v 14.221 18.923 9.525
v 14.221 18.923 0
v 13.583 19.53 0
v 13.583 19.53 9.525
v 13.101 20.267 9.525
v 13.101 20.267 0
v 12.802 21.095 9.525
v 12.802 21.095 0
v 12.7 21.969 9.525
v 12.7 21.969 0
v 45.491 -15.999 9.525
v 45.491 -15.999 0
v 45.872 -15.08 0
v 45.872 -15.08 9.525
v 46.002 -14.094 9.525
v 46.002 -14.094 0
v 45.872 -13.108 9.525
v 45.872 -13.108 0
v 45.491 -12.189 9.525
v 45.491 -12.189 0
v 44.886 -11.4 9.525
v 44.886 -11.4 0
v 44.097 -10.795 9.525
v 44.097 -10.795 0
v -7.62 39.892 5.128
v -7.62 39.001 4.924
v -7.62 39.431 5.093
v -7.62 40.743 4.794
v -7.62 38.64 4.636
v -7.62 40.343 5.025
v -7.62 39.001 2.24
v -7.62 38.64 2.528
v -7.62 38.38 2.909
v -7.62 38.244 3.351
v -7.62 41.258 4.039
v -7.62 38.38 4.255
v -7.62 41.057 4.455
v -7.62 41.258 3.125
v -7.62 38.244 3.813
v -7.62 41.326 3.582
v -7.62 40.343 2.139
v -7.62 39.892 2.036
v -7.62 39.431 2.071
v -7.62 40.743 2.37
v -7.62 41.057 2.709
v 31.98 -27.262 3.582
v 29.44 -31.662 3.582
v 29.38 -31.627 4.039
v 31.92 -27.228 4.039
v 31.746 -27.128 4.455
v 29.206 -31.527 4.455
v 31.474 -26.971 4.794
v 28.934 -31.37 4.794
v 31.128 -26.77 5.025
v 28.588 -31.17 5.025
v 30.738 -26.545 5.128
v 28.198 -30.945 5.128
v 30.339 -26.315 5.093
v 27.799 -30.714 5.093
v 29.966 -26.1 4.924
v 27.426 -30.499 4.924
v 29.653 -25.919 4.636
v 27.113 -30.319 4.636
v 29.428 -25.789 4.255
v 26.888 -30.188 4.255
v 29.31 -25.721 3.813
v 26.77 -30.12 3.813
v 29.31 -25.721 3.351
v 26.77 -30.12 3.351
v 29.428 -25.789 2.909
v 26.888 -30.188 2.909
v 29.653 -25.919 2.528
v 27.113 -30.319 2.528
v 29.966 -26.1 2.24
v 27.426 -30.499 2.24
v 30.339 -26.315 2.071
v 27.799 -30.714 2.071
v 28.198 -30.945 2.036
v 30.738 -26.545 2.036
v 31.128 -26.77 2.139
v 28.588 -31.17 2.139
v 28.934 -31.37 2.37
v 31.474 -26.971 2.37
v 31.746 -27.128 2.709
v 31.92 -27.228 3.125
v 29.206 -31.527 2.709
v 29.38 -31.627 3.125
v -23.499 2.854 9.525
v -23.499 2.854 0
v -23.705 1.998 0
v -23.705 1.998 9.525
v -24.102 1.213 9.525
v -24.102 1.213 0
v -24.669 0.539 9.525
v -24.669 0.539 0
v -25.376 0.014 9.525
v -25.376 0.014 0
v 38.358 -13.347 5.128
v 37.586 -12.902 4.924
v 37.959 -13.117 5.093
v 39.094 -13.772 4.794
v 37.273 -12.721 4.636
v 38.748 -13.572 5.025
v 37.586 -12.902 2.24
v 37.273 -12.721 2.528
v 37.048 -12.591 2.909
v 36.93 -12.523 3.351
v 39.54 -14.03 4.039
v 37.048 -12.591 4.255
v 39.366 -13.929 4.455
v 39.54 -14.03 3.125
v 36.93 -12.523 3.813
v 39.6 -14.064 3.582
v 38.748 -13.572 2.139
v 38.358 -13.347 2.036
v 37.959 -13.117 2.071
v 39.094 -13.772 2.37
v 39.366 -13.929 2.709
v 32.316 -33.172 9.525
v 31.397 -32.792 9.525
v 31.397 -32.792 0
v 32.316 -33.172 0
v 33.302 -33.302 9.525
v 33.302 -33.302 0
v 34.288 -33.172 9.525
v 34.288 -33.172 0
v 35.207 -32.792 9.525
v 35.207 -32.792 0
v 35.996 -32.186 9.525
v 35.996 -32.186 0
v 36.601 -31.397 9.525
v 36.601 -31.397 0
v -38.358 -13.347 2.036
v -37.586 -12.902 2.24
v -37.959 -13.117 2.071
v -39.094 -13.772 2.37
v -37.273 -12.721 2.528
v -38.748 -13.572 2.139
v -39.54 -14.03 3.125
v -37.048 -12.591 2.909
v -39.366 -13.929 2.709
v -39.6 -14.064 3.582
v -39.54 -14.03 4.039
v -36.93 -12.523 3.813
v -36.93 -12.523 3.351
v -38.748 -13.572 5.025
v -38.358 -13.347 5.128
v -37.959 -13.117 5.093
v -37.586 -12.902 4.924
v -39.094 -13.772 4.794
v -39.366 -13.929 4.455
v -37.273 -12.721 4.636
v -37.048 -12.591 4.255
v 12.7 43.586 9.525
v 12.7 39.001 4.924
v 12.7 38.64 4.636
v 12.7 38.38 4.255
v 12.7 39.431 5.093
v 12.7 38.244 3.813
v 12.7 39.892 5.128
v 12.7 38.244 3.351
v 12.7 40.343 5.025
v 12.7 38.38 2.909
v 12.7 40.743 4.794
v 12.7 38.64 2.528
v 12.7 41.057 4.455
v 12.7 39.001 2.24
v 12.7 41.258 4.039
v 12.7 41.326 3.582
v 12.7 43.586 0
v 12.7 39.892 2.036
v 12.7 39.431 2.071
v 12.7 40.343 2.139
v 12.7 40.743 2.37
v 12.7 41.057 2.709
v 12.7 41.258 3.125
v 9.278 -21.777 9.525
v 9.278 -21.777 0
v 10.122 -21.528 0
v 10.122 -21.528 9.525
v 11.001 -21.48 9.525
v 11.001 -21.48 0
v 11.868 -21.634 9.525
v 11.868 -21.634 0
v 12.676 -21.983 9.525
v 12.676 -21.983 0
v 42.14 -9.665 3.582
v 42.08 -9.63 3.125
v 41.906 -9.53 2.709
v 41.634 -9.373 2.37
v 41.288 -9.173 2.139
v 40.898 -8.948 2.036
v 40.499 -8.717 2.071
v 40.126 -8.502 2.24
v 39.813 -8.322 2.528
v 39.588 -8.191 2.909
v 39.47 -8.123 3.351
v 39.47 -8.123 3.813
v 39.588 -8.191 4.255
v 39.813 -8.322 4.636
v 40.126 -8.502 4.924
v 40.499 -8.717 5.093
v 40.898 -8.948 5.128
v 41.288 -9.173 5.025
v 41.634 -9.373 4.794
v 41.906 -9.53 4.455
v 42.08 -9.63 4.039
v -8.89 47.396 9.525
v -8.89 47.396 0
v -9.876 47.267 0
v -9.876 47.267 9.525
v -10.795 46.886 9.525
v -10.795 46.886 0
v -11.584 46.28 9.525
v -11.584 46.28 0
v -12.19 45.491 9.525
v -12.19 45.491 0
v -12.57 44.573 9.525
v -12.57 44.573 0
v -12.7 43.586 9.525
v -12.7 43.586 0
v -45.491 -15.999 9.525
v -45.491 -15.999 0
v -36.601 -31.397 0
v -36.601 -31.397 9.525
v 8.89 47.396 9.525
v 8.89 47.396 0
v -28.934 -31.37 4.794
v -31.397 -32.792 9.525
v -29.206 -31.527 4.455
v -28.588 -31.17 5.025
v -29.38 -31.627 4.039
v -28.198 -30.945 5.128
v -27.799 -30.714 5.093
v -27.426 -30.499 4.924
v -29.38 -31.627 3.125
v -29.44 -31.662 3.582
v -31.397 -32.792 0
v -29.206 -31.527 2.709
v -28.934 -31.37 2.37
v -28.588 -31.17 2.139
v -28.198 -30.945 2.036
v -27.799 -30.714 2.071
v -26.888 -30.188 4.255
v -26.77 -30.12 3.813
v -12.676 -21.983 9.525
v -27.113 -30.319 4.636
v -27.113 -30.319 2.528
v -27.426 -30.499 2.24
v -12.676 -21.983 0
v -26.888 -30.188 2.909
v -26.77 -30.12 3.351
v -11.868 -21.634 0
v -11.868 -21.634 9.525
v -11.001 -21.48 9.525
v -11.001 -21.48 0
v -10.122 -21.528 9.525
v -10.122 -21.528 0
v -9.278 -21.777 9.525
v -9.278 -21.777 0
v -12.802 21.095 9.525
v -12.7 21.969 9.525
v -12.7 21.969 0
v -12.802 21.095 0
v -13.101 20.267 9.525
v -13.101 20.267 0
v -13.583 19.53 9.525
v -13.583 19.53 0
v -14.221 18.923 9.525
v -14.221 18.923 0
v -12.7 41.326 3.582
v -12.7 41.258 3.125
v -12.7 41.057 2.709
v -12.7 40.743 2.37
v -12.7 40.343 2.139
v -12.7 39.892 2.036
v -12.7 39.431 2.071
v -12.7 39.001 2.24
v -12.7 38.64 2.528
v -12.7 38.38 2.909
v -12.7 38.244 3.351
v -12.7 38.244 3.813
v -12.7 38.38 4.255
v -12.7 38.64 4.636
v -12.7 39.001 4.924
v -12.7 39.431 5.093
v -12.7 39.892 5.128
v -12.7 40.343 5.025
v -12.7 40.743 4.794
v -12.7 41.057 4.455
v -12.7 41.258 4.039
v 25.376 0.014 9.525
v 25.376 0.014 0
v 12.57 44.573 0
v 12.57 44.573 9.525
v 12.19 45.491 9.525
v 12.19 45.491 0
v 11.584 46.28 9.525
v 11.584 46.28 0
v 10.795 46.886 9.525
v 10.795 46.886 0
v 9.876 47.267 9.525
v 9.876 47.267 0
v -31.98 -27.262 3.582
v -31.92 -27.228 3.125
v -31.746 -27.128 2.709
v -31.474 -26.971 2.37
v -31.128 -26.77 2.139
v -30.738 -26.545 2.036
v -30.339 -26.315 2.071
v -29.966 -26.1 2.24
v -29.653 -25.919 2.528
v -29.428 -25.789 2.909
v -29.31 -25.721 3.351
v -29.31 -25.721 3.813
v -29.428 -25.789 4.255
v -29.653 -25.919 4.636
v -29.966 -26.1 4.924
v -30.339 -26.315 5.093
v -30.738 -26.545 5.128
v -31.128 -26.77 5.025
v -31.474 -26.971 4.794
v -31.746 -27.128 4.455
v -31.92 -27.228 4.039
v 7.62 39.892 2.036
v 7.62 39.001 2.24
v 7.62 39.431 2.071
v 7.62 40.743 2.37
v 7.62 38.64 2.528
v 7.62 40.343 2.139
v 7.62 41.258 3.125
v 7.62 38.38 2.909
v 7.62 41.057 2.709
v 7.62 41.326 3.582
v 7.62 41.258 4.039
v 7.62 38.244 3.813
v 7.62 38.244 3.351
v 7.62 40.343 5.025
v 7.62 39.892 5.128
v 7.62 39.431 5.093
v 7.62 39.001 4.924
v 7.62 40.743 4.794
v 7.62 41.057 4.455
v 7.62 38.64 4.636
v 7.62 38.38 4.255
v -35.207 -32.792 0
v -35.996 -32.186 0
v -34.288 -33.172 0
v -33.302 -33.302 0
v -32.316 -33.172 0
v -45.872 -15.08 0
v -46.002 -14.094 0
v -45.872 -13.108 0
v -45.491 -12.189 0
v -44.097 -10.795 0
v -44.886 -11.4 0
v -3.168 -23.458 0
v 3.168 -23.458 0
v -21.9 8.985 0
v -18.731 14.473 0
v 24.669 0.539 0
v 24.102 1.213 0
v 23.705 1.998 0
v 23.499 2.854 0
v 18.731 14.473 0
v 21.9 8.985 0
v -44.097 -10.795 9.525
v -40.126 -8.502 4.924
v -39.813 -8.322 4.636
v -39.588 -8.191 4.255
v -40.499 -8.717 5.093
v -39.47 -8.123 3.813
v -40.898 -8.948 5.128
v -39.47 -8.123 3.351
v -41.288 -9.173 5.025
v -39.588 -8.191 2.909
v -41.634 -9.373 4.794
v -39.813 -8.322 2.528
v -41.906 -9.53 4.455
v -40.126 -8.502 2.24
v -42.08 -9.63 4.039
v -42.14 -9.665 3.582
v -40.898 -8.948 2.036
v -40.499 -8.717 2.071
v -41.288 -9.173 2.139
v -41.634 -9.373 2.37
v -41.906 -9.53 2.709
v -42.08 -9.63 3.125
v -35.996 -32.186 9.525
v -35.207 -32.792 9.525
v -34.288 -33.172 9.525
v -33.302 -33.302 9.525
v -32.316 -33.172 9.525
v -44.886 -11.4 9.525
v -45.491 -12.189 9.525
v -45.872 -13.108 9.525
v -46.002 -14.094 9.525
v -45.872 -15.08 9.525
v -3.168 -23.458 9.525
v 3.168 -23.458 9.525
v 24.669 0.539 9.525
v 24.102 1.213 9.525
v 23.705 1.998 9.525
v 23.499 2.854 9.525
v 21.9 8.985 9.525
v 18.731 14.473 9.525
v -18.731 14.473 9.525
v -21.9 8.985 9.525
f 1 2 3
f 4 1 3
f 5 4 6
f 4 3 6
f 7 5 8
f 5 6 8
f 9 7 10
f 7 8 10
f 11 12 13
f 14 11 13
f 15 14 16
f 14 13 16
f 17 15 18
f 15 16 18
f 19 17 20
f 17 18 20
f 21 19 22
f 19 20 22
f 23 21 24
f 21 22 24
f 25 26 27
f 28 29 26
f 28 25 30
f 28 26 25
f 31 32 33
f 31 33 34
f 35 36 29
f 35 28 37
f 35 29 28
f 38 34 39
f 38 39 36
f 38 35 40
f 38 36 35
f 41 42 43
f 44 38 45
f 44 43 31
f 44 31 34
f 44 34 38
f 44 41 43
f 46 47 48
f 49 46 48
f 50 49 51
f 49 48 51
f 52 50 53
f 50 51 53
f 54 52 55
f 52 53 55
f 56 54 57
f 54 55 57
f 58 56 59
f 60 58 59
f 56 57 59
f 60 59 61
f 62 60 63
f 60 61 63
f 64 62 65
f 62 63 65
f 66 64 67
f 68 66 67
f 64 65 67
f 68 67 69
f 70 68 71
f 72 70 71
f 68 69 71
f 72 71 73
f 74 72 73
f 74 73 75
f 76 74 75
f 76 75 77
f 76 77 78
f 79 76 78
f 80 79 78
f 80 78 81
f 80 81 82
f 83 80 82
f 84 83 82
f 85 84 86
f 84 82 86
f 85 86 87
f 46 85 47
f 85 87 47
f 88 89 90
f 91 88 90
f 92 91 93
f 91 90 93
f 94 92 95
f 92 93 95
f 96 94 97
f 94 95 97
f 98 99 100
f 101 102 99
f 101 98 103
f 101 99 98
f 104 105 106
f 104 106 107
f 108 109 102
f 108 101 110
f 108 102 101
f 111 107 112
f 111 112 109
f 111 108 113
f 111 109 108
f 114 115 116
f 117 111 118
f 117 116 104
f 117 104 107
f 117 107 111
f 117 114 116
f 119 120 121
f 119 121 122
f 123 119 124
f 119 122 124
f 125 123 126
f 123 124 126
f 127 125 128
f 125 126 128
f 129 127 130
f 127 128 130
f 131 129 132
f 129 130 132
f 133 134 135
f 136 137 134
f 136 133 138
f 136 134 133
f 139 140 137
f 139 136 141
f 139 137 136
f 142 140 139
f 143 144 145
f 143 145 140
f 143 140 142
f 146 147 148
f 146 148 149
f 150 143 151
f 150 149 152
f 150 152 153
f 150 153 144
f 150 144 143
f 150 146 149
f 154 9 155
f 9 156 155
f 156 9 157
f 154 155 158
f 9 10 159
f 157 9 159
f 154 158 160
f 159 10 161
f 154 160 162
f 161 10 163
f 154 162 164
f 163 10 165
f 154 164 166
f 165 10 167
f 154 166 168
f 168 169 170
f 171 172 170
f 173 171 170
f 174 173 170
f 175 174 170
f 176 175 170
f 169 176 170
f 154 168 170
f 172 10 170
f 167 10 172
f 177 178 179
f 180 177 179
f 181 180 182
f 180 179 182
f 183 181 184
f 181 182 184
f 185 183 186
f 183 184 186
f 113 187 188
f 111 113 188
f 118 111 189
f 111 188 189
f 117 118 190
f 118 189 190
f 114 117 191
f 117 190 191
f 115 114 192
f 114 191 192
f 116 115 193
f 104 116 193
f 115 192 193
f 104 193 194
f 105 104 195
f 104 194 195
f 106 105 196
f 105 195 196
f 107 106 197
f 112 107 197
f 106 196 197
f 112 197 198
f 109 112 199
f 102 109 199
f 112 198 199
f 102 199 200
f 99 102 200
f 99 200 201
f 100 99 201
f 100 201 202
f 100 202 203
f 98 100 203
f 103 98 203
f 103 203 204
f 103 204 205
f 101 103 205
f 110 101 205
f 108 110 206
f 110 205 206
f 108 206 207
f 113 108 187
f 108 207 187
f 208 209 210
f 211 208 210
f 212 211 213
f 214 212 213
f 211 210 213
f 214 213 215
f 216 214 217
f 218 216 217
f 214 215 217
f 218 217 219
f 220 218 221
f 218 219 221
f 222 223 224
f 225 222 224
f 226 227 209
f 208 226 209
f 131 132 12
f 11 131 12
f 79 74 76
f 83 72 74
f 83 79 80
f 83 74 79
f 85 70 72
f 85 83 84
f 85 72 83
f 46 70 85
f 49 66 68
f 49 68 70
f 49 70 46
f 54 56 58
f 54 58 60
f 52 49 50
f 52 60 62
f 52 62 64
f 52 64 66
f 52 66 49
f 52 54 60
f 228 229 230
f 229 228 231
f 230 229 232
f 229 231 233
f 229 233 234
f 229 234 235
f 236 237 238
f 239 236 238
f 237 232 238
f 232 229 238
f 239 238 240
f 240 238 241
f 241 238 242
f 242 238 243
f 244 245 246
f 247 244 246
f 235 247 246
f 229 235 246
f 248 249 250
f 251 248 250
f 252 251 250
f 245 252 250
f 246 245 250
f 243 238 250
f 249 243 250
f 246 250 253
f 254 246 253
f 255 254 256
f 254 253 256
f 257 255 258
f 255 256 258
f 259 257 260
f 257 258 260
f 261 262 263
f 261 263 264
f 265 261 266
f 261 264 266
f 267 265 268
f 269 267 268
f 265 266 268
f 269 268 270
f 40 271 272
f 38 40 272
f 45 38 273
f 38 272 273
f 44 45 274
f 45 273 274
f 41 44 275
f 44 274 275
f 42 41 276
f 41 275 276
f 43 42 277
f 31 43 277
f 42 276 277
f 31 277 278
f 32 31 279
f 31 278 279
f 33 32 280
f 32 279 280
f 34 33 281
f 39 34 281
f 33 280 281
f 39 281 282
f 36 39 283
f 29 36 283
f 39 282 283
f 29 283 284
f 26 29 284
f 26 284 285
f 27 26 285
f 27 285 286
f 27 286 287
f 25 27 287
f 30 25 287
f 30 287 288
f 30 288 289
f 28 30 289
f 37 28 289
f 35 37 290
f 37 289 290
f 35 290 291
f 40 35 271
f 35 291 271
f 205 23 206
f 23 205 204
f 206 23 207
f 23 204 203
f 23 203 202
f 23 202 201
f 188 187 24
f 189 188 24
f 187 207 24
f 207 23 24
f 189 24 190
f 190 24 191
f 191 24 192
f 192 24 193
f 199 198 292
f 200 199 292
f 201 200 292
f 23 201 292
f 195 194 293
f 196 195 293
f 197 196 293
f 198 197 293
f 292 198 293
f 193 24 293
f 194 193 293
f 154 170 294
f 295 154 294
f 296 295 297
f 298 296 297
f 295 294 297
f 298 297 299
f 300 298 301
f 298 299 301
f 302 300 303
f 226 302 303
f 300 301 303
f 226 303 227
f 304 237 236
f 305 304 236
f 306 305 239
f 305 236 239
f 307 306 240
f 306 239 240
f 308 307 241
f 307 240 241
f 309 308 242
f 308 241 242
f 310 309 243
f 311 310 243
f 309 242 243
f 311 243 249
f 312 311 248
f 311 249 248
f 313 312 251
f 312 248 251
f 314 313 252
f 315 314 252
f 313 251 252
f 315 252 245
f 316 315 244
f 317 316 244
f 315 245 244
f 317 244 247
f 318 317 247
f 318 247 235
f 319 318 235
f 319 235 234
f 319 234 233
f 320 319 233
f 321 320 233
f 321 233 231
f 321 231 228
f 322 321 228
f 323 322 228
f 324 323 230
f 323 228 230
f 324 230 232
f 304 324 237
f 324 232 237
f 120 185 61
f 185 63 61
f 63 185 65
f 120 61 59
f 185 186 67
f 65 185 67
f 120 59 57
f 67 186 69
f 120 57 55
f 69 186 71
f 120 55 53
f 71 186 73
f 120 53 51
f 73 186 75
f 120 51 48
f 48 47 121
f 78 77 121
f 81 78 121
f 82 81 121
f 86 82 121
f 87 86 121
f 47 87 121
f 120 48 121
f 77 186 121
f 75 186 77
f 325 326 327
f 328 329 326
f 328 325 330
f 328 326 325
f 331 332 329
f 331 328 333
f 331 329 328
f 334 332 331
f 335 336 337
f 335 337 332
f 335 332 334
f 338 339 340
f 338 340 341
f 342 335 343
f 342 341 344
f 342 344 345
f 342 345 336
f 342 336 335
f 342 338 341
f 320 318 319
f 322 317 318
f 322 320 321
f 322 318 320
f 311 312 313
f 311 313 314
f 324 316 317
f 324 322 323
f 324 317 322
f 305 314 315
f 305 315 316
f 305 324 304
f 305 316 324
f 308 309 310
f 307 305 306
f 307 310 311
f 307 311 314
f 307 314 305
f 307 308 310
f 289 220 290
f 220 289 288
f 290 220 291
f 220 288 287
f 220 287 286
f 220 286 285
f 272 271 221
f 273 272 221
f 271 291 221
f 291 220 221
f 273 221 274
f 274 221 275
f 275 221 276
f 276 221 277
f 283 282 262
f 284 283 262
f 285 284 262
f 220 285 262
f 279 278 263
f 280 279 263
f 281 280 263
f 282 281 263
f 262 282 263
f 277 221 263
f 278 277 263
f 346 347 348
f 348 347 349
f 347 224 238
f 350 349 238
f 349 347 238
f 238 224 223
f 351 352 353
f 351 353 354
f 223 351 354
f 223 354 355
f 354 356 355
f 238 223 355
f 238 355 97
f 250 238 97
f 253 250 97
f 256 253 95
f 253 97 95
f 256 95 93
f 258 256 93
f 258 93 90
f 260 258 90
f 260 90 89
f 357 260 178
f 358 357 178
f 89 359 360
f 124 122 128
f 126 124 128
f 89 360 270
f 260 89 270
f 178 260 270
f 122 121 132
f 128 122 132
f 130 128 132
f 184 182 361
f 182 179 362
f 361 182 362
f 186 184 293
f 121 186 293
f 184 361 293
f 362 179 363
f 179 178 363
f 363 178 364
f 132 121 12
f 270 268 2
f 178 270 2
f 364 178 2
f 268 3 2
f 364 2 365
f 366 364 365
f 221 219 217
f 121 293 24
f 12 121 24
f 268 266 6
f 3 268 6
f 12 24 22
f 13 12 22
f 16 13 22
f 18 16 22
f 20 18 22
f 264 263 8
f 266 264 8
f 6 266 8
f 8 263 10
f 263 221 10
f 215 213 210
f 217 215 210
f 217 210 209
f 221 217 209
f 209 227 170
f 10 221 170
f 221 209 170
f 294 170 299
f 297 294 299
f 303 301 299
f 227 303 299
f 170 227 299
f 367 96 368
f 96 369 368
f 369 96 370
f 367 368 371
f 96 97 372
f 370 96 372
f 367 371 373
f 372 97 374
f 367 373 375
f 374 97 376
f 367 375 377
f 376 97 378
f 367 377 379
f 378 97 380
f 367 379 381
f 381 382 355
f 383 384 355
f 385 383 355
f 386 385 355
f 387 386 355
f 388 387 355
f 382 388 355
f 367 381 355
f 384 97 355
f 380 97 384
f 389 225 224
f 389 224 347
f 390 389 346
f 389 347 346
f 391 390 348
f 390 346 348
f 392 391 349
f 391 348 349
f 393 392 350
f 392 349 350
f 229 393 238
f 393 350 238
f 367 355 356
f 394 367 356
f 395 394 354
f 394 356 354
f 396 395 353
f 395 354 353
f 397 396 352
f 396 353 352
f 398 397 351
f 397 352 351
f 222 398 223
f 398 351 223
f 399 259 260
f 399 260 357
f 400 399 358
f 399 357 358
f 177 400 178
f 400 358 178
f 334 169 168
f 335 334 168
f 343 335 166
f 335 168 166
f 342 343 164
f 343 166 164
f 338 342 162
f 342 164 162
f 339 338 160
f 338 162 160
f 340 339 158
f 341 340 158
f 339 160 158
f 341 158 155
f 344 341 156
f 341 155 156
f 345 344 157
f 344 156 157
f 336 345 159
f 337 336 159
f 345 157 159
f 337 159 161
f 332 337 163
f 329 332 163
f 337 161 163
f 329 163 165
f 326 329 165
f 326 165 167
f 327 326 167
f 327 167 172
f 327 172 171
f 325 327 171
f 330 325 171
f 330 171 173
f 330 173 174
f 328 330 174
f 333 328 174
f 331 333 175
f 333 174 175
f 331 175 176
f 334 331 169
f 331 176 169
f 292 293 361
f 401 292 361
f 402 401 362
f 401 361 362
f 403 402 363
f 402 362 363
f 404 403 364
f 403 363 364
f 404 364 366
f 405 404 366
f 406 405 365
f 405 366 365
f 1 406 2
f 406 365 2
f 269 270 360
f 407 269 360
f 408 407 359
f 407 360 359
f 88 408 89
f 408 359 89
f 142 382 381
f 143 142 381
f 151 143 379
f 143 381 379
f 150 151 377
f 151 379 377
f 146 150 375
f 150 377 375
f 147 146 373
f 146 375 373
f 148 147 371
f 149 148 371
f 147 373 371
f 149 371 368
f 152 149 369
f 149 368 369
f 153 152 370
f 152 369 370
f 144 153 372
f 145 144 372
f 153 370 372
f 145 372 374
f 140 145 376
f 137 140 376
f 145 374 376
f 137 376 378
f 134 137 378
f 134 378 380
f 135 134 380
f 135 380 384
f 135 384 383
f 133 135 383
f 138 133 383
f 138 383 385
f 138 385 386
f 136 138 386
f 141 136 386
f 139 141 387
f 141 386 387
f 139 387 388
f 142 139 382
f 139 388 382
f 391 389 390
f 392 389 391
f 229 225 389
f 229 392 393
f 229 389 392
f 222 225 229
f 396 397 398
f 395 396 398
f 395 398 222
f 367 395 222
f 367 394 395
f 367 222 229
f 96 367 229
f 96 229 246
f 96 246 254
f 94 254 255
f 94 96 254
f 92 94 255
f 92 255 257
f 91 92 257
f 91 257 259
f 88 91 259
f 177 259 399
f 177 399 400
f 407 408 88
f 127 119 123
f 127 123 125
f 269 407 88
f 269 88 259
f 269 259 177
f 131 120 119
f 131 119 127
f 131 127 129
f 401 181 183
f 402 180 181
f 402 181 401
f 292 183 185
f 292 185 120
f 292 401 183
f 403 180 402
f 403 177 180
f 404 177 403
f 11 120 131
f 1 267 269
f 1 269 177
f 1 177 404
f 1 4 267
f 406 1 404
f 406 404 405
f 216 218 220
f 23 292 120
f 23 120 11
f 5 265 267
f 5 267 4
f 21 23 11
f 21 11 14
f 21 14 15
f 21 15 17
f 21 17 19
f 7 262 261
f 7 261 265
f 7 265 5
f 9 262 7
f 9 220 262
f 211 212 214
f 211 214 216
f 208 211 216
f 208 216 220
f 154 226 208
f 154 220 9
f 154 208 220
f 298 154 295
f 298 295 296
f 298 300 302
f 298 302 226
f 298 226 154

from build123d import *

# Parameters (mm, degrees)
BOSS_EXTRUDE1_DEPTH = 9.525
SKETCH3_R           = 1.55
CUT_EXTRUDE2_DEPTH  = 5.08
CUT_EXTRUDE3_START  = -5.08
SKETCH4_R           = 1.55
CUT_EXTRUDE3_DEPTH  = 5.08
CIRPATTERN2_COUNT   = 3


with BuildPart() as part:
    # Sketch1 → Boss-Extrude1 (new body)
    with BuildSketch(Plane.XY):
        with BuildLine():
            Line((12.7, 21.969079793), (12.7, 43.5864))
            ThreePointArc((12.7, 43.5864), (11.584076836, 46.280476836), (8.89, 47.3964))
            Line((8.89, 47.3964), (-8.89, 47.3964))
            ThreePointArc((-8.89, 47.3964), (-11.584076836, 46.280476836), (-12.7, 43.5864))
            Line((-12.7, 43.5864), (-12.7, 21.969079793))
            ThreePointArc((-12.7, 21.969079793), (-13.101409662, 20.266842468), (-14.221056121, 18.923289925))
            ThreePointArc((-14.221056121, 18.923289925), (-20.499926929, 11.835638331), (-23.498577859, 2.854150907))
            ThreePointArc((-23.498577859, 2.854150907), (-24.102305263, 1.212732359), (-25.375781199, 0.013982731))
            Line((-25.375781199, 0.013982731), (-44.09692966, -10.794677372))
            ThreePointArc((-44.09692966, -10.794677372), (-45.872107058, -13.108133599), (-45.491486448, -15.99923416))
            Line((-45.491486448, -15.99923416), (-36.601486448, -31.39716584))
            ThreePointArc((-36.601486448, -31.39716584), (-34.288030221, -33.172343238), (-31.39692966, -32.791722628))
            Line((-31.39692966, -32.791722628), (-12.675781199, -21.983062525))
            ThreePointArc((-12.675781199, -21.983062525), (-11.000895601, -21.479574827), (-9.277521738, -21.777440832))
            ThreePointArc((-9.277521738, -21.777440832), (0, -23.671276662), (9.277521738, -21.777440832))
            ThreePointArc((9.277521738, -21.777440832), (11.000895601, -21.479574827), (12.675781199, -21.983062525))
            Line((12.675781199, -21.983062525), (31.39692966, -32.791722628))
            ThreePointArc((31.39692966, -32.791722628), (34.288030221, -33.172343238), (36.601486448, -31.39716584))
            Line((36.601486448, -31.39716584), (45.491486448, -15.99923416))
            ThreePointArc((45.491486448, -15.99923416), (45.872107058, -13.108133599), (44.09692966, -10.794677372))
            Line((44.09692966, -10.794677372), (25.375781199, 0.013982731))
            ThreePointArc((25.375781199, 0.013982731), (24.102305263, 1.212732359), (23.498577859, 2.854150907))
            ThreePointArc((23.498577859, 2.854150907), (20.499926929, 11.835638331), (14.221056121, 18.923289925))
            ThreePointArc((14.221056121, 18.923289925), (13.101409662, 20.266842468), (12.7, 21.969079793))
        make_face()
    extrude(amount=BOSS_EXTRUDE1_DEPTH)

    # Sketch3 → Cut-Extrude2 (cut)
    with BuildSketch(Plane(origin=(-6.35, -10.998522628, 0), x_dir=(0.8660254037844575, -0.4999999999999674, 0), z_dir=(-0.4999999999999675, -0.8660254037844576, 0))):
        with Locations((39.7764, 3.582)):
            Circle(SKETCH3_R)
    cut_extrude2 = extrude(amount=-CUT_EXTRUDE2_DEPTH, mode=Mode.SUBTRACT)

    # Sketch4 → Cut-Extrude3 (cut)
    with BuildSketch(Plane(origin=(6.35, 10.998522628, 0), x_dir=(0.8660254037844387, -0.49999999999999983, 0), z_dir=(0.49999999999999983, 0.8660254037844387, 0)).offset(CUT_EXTRUDE3_START)):
        with Locations((39.7764, -3.582)):
            Circle(SKETCH4_R)
    cut_extrude3 = extrude(amount=CUT_EXTRUDE3_DEPTH, mode=Mode.SUBTRACT)

    # CirPattern2: Cut-Extrude2, Cut-Extrude3 ×3 about axis
    cirpattern2_axis = Axis((0, 0, 0), (0, 0, -1))
    add([cut_extrude2.rotate(cirpattern2_axis, i * 360 / CIRPATTERN2_COUNT) for i in range(1, CIRPATTERN2_COUNT)], mode=Mode.SUBTRACT)
    add([cut_extrude3.rotate(cirpattern2_axis, i * 360 / CIRPATTERN2_COUNT) for i in range(1, CIRPATTERN2_COUNT)], mode=Mode.SUBTRACT)


solid = part.part
